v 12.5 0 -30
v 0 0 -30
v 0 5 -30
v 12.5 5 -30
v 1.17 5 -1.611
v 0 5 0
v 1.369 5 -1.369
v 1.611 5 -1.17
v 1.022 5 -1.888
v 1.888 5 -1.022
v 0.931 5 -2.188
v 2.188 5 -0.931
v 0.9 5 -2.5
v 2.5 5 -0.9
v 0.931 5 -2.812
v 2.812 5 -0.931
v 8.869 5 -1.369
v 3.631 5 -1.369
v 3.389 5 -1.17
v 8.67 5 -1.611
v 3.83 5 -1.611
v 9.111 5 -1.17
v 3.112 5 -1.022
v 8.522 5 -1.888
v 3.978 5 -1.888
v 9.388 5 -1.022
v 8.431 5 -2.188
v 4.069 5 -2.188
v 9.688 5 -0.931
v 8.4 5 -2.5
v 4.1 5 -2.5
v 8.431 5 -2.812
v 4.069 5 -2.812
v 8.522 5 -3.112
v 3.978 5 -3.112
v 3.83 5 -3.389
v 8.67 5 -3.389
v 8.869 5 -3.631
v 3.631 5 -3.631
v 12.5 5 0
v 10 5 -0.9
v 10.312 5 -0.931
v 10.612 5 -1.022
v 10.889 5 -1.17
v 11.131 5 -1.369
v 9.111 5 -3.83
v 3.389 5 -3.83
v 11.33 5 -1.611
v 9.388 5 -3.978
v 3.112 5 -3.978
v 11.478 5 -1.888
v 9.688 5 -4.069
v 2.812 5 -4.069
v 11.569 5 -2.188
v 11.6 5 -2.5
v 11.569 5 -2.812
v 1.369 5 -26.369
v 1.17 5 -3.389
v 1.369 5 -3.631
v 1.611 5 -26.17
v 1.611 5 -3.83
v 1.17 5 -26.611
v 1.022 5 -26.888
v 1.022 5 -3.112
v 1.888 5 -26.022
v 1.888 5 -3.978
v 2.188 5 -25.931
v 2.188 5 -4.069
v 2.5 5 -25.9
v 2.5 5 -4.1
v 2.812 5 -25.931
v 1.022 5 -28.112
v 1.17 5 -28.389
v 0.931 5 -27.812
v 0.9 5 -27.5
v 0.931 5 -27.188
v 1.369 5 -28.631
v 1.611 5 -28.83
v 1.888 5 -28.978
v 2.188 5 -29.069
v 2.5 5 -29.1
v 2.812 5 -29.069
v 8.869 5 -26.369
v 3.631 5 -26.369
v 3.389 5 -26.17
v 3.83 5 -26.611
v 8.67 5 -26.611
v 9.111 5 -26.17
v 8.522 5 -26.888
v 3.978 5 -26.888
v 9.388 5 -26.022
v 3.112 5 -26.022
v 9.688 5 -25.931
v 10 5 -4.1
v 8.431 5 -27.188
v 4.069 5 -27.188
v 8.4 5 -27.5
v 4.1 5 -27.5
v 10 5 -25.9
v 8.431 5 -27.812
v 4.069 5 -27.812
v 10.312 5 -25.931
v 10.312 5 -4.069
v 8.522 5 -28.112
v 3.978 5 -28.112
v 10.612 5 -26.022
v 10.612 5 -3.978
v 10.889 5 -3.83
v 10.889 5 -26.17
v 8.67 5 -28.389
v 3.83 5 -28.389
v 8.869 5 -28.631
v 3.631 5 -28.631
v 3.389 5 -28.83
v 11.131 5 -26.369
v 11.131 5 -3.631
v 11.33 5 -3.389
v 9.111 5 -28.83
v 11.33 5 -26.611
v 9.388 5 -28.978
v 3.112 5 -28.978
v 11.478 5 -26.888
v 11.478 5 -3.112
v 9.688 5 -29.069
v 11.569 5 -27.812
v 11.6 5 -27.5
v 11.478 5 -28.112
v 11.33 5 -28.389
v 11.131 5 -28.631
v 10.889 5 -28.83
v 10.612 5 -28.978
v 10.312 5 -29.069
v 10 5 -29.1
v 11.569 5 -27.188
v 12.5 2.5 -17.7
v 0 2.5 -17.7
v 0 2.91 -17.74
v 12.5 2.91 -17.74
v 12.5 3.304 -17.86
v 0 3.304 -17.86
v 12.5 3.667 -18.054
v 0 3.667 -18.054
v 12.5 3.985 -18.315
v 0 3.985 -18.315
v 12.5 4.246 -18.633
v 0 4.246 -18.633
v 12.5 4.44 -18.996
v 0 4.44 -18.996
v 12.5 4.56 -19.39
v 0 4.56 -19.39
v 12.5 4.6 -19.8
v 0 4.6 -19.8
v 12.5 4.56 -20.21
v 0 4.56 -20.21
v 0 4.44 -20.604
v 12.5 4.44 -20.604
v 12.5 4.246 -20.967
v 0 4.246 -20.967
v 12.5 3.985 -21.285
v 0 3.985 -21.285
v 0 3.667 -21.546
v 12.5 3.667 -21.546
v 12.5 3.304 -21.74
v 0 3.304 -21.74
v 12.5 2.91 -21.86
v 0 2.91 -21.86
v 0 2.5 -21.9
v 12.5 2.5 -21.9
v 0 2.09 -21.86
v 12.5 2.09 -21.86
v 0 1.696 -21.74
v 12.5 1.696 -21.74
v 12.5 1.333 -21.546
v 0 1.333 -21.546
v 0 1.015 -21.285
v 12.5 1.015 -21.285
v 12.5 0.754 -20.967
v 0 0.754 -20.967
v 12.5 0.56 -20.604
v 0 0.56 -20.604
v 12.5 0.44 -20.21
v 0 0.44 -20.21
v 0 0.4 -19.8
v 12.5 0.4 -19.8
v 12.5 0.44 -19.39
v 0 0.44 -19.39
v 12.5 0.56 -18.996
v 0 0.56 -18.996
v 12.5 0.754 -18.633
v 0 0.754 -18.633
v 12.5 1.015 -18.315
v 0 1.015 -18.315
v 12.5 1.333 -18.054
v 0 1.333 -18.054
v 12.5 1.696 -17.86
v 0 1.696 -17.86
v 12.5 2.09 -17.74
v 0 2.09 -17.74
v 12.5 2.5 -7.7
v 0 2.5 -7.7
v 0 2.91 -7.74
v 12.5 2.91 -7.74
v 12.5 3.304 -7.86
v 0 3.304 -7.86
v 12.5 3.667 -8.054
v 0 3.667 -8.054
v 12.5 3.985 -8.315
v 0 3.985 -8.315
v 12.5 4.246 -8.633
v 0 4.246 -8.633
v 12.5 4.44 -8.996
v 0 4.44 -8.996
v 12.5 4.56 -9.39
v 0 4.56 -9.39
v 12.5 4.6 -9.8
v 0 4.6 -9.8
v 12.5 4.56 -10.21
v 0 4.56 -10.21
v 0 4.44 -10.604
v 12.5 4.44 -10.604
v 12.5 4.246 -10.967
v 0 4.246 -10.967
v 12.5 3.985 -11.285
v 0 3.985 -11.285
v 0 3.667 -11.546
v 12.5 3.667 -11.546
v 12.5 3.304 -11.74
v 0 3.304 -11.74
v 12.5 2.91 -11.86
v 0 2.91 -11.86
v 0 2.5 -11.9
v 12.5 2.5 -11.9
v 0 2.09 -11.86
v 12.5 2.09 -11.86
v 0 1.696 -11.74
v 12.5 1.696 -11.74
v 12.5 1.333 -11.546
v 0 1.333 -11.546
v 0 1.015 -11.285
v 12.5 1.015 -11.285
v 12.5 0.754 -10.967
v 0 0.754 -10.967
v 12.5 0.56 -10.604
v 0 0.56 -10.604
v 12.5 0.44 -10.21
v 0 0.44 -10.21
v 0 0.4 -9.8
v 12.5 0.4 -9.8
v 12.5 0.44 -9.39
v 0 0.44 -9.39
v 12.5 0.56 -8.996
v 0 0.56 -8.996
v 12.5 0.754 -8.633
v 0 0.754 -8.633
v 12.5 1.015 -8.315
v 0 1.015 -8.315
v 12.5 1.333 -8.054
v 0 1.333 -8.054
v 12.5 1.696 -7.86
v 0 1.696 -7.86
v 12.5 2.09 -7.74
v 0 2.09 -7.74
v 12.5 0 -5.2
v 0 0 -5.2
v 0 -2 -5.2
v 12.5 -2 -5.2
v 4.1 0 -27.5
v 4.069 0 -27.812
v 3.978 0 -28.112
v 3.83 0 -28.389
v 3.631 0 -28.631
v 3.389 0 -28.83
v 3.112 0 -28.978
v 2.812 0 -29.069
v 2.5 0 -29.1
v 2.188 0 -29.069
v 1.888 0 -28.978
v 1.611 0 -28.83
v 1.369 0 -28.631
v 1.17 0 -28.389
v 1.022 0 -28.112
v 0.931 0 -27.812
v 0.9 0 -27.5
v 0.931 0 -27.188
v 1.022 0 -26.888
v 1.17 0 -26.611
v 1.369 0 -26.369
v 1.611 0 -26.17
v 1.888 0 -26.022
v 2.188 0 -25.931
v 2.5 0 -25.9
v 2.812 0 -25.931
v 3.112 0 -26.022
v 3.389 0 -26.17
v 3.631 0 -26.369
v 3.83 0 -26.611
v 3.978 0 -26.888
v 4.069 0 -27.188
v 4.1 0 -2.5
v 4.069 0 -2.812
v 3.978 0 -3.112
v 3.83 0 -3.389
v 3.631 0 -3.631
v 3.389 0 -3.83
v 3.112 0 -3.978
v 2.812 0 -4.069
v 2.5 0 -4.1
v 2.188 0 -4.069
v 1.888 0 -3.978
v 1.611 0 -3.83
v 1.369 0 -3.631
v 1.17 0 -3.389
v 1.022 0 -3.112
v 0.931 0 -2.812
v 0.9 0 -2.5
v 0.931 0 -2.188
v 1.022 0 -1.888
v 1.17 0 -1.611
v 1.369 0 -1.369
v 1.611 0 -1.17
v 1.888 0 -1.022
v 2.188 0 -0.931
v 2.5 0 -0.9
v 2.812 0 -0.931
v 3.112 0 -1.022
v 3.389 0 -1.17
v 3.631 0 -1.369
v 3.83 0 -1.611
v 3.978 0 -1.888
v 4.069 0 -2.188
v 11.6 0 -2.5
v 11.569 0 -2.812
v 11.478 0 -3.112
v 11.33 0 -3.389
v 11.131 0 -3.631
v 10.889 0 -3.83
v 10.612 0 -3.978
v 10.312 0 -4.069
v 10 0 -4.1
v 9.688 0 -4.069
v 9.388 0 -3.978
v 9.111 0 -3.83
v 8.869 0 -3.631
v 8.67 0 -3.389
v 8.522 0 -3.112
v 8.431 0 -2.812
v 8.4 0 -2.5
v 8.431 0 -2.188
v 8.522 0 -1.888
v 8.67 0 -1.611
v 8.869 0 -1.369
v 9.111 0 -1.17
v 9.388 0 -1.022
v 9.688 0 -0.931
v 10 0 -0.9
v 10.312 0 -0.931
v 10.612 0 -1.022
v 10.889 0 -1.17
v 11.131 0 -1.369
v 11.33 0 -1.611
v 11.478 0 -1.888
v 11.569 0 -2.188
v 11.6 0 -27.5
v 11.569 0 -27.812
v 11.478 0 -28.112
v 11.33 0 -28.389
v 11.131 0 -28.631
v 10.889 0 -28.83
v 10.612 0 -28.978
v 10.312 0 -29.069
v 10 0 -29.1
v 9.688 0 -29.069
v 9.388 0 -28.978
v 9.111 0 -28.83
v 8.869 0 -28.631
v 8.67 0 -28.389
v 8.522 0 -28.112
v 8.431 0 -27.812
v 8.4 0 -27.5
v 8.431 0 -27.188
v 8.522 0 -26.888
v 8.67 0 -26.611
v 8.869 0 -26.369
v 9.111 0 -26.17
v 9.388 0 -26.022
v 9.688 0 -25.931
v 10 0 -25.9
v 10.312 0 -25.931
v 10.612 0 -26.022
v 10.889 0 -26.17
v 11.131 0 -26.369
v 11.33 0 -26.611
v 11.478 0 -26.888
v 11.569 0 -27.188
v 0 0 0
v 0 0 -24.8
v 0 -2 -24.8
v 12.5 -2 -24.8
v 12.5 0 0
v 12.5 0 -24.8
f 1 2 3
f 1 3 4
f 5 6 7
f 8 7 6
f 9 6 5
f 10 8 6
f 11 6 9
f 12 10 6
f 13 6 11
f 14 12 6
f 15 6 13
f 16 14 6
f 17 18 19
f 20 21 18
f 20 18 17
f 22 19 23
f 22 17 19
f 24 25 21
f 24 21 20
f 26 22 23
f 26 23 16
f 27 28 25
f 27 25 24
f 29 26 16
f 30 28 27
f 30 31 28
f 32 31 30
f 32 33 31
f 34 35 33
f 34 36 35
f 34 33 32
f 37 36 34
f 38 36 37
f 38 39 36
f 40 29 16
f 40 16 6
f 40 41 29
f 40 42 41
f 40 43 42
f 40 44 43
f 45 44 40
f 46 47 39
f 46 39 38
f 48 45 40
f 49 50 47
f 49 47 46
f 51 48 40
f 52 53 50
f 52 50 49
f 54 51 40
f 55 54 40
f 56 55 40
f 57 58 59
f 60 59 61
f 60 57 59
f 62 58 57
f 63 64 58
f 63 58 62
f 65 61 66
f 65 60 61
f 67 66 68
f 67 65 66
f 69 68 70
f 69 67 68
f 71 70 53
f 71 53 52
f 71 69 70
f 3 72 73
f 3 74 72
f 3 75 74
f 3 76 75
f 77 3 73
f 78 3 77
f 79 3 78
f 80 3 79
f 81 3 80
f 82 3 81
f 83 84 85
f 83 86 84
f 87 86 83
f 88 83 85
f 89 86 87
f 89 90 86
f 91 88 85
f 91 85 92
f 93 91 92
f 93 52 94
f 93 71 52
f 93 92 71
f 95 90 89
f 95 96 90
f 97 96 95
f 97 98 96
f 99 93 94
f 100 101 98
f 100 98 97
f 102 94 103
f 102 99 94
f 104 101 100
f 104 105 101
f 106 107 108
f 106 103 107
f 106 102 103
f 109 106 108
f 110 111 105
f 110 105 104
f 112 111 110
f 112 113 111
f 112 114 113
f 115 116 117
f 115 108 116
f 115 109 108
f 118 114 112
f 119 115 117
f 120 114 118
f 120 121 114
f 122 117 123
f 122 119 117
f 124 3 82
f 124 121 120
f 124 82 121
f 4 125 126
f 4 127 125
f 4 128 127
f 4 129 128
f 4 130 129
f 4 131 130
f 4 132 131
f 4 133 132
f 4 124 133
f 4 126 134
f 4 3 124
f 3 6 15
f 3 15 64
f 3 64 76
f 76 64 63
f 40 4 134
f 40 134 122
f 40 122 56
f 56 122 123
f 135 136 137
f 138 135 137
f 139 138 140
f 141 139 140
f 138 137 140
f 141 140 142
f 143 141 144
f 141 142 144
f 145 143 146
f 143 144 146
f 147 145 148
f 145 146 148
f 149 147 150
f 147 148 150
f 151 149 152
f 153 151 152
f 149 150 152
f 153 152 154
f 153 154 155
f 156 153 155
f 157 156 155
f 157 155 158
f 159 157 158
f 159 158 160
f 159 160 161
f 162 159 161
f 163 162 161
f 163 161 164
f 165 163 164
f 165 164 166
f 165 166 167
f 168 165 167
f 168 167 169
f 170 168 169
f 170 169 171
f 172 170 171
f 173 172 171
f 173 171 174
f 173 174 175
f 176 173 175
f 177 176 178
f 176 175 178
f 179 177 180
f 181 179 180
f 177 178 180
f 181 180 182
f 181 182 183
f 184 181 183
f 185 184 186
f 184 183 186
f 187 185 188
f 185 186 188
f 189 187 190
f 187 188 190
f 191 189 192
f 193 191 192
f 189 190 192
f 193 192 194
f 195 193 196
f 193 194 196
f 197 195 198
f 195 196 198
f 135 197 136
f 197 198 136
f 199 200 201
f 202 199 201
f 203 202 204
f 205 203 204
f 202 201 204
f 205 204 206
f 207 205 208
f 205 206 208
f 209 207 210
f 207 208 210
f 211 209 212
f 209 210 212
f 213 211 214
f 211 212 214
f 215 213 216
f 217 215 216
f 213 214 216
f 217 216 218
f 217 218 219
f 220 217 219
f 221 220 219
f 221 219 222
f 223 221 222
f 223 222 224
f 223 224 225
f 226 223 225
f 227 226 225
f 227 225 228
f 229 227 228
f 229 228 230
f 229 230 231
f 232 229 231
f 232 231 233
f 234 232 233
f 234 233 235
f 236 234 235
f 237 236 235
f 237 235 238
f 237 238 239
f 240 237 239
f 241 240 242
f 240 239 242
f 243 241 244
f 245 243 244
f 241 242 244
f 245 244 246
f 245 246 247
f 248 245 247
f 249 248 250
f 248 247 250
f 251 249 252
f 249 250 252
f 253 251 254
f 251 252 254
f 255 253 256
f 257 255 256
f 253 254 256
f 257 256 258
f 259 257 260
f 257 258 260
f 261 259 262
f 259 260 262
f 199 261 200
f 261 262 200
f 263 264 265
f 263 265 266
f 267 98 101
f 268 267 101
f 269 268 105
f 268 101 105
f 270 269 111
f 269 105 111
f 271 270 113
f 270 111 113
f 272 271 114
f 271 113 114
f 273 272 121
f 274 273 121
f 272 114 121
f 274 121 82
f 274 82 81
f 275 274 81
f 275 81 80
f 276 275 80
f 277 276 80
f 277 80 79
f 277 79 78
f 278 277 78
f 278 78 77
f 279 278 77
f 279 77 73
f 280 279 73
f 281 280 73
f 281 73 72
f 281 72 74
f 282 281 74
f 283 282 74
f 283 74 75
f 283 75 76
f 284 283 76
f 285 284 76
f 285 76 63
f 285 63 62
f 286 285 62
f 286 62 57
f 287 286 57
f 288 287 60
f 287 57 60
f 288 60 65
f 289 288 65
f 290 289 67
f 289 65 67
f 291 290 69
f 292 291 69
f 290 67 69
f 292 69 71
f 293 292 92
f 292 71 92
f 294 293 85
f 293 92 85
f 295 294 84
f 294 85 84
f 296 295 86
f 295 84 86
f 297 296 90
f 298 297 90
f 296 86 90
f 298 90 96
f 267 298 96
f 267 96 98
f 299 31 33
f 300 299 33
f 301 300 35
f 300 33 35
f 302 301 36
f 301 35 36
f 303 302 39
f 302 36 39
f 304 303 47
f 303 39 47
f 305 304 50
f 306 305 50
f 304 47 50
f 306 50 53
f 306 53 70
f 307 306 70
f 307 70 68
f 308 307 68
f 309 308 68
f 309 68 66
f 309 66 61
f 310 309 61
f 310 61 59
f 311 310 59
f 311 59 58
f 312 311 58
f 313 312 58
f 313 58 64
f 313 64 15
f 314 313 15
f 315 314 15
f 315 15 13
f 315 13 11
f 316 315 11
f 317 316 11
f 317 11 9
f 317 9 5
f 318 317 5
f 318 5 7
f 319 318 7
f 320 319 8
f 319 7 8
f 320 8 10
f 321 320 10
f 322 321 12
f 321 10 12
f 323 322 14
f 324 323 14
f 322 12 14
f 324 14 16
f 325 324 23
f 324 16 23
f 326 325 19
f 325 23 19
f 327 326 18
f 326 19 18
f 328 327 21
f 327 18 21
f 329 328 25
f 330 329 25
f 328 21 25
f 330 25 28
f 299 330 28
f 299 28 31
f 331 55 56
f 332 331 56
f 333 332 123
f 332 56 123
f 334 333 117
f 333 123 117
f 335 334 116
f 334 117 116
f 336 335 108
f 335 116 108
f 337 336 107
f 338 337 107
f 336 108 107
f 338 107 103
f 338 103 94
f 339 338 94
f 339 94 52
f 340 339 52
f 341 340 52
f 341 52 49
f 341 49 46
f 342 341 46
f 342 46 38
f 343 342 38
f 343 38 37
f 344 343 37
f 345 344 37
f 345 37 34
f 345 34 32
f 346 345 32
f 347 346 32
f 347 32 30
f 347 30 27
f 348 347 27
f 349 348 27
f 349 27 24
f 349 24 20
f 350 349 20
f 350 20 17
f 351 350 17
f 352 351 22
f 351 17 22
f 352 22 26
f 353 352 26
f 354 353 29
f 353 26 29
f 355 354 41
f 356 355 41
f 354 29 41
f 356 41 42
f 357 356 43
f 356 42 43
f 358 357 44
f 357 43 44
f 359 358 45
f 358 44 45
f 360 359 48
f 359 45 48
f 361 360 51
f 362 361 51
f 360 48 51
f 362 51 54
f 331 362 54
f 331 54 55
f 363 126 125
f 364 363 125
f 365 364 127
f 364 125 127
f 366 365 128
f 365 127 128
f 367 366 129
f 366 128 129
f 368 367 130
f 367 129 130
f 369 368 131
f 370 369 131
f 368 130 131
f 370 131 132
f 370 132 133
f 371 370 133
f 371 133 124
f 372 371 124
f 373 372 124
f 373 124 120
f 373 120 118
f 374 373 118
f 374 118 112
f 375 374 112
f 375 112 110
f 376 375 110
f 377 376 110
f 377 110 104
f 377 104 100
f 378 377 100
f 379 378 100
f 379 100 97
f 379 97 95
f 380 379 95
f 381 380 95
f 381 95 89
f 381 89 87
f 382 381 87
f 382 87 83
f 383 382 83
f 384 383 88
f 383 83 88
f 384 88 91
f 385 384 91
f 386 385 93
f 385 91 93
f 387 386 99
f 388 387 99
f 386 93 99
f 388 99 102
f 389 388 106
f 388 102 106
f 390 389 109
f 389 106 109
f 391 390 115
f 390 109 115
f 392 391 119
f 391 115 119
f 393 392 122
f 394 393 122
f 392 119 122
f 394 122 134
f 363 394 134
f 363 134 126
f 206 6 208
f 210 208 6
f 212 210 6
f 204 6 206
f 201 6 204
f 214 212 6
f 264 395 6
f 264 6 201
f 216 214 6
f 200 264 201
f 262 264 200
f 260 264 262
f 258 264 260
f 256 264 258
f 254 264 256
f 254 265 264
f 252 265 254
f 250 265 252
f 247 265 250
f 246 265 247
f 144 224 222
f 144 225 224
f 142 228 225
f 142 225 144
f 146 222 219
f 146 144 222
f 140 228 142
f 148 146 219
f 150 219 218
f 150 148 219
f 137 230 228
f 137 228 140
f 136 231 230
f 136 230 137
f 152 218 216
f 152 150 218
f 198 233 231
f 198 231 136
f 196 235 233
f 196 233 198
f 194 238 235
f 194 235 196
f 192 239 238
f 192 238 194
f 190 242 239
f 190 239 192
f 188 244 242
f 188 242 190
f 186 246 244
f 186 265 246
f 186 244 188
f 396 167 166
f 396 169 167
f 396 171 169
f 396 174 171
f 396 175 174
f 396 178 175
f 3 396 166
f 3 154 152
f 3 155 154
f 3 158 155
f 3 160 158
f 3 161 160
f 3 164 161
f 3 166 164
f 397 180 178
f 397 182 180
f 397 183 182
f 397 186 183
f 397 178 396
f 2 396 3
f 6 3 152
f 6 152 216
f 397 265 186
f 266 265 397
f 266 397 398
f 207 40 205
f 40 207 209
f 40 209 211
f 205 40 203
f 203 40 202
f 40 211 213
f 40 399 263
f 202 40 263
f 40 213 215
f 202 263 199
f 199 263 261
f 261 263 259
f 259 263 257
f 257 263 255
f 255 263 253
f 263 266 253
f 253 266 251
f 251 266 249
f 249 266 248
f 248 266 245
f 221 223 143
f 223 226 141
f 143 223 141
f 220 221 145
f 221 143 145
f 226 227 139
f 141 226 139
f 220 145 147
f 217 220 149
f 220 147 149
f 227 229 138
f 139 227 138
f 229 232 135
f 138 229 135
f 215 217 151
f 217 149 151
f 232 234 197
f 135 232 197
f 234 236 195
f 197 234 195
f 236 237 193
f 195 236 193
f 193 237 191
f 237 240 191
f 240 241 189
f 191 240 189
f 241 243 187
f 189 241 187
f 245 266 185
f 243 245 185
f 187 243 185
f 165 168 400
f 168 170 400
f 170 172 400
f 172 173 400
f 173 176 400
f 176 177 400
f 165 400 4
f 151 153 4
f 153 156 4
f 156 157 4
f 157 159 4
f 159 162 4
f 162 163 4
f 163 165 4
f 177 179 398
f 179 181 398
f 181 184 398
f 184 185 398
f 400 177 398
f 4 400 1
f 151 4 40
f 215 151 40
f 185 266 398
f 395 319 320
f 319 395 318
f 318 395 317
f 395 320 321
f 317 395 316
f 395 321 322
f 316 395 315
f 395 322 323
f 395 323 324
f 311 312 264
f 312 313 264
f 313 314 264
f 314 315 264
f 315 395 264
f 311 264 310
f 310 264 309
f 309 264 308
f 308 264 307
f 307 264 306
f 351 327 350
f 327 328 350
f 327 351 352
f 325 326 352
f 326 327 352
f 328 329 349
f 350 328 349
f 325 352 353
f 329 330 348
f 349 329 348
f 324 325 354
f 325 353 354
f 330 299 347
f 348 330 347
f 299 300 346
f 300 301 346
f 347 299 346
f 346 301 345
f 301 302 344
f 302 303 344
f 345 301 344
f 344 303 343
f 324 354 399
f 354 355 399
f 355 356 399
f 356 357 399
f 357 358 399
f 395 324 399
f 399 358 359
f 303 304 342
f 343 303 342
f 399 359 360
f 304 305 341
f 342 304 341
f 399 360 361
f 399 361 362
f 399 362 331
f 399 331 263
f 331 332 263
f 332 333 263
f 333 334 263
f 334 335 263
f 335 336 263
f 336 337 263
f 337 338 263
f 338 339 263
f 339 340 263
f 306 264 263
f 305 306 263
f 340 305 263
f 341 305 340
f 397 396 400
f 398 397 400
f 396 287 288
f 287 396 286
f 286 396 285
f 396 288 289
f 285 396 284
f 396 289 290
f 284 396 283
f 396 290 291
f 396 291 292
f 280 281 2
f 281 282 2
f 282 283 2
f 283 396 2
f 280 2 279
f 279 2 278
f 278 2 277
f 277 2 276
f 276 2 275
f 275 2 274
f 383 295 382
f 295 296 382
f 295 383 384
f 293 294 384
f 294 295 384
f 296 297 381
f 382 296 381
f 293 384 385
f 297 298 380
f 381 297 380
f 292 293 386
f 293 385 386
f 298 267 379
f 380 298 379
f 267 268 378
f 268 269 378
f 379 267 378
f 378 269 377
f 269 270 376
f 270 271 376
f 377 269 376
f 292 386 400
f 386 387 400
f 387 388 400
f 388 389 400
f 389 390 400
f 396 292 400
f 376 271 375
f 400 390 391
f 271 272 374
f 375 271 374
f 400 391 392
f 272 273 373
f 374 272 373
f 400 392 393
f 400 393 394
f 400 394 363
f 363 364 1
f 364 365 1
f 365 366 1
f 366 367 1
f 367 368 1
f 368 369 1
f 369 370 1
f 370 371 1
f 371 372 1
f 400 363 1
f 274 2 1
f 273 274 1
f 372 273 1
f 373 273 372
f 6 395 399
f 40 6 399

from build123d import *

# Parameters (mm, degrees)
SKETCH1_W           = 12.5
SKETCH1_H           = 30
BOSS_EXTRUDE1_DEPTH = 5
SKETCH2_W           = 12.5
SKETCH2_H           = 19.6
BOSS_EXTRUDE2_DEPTH = 2
SKETCH3_R           = 2.1
CUT_EXTRUDE1_DEPTH  = 15
SKETCH4_R           = 1.6
CUT_EXTRUDE2_DEPTH  = 10
LPATTERN1_COUNT     = 2
LPATTERN1_PITCH     = 7.5


with BuildPart() as part:
    # Sketch1 → Boss-Extrude1 (new body)
    with BuildSketch(Plane(origin=(0, 0, 0), x_dir=(1, 0, 0), z_dir=(0, 1, 0))):
        with Locations((6.25, 15)):
            Rectangle(SKETCH1_W, SKETCH1_H)
    extrude(amount=BOSS_EXTRUDE1_DEPTH)

    # Sketch2 → Boss-Extrude2 (add)
    with BuildSketch(Plane.XZ):
        with Locations((6.25, -15)):
            Rectangle(SKETCH2_W, SKETCH2_H)
    extrude(amount=BOSS_EXTRUDE2_DEPTH)

    # Sketch3 → Cut-Extrude1 (cut)
    with BuildSketch(Plane.ZY):
        with Locations((-19.8, 2.5)):
            Circle(SKETCH3_R)
        with Locations((-9.8, 2.5)):
            Circle(SKETCH3_R)
    extrude(amount=-CUT_EXTRUDE1_DEPTH, mode=Mode.SUBTRACT)

    # Sketch4 → Cut-Extrude2 (cut)
    with BuildSketch(Plane(origin=(0, 5, 0), x_dir=(1, 0, 0), z_dir=(0, 1, 0))):
        with Locations((2.5, 27.5)):
            Circle(SKETCH4_R)
        with Locations((2.5, 2.5)):
            Circle(SKETCH4_R)
    cut_extrude2 = extrude(amount=-CUT_EXTRUDE2_DEPTH, mode=Mode.SUBTRACT)

    # LPattern1: Cut-Extrude2 ×2
    with Locations(*[(i * LPATTERN1_PITCH, 0, 0) for i in range(1, LPATTERN1_COUNT)]):
        add(cut_extrude2, mode=Mode.SUBTRACT)


solid = part.part
